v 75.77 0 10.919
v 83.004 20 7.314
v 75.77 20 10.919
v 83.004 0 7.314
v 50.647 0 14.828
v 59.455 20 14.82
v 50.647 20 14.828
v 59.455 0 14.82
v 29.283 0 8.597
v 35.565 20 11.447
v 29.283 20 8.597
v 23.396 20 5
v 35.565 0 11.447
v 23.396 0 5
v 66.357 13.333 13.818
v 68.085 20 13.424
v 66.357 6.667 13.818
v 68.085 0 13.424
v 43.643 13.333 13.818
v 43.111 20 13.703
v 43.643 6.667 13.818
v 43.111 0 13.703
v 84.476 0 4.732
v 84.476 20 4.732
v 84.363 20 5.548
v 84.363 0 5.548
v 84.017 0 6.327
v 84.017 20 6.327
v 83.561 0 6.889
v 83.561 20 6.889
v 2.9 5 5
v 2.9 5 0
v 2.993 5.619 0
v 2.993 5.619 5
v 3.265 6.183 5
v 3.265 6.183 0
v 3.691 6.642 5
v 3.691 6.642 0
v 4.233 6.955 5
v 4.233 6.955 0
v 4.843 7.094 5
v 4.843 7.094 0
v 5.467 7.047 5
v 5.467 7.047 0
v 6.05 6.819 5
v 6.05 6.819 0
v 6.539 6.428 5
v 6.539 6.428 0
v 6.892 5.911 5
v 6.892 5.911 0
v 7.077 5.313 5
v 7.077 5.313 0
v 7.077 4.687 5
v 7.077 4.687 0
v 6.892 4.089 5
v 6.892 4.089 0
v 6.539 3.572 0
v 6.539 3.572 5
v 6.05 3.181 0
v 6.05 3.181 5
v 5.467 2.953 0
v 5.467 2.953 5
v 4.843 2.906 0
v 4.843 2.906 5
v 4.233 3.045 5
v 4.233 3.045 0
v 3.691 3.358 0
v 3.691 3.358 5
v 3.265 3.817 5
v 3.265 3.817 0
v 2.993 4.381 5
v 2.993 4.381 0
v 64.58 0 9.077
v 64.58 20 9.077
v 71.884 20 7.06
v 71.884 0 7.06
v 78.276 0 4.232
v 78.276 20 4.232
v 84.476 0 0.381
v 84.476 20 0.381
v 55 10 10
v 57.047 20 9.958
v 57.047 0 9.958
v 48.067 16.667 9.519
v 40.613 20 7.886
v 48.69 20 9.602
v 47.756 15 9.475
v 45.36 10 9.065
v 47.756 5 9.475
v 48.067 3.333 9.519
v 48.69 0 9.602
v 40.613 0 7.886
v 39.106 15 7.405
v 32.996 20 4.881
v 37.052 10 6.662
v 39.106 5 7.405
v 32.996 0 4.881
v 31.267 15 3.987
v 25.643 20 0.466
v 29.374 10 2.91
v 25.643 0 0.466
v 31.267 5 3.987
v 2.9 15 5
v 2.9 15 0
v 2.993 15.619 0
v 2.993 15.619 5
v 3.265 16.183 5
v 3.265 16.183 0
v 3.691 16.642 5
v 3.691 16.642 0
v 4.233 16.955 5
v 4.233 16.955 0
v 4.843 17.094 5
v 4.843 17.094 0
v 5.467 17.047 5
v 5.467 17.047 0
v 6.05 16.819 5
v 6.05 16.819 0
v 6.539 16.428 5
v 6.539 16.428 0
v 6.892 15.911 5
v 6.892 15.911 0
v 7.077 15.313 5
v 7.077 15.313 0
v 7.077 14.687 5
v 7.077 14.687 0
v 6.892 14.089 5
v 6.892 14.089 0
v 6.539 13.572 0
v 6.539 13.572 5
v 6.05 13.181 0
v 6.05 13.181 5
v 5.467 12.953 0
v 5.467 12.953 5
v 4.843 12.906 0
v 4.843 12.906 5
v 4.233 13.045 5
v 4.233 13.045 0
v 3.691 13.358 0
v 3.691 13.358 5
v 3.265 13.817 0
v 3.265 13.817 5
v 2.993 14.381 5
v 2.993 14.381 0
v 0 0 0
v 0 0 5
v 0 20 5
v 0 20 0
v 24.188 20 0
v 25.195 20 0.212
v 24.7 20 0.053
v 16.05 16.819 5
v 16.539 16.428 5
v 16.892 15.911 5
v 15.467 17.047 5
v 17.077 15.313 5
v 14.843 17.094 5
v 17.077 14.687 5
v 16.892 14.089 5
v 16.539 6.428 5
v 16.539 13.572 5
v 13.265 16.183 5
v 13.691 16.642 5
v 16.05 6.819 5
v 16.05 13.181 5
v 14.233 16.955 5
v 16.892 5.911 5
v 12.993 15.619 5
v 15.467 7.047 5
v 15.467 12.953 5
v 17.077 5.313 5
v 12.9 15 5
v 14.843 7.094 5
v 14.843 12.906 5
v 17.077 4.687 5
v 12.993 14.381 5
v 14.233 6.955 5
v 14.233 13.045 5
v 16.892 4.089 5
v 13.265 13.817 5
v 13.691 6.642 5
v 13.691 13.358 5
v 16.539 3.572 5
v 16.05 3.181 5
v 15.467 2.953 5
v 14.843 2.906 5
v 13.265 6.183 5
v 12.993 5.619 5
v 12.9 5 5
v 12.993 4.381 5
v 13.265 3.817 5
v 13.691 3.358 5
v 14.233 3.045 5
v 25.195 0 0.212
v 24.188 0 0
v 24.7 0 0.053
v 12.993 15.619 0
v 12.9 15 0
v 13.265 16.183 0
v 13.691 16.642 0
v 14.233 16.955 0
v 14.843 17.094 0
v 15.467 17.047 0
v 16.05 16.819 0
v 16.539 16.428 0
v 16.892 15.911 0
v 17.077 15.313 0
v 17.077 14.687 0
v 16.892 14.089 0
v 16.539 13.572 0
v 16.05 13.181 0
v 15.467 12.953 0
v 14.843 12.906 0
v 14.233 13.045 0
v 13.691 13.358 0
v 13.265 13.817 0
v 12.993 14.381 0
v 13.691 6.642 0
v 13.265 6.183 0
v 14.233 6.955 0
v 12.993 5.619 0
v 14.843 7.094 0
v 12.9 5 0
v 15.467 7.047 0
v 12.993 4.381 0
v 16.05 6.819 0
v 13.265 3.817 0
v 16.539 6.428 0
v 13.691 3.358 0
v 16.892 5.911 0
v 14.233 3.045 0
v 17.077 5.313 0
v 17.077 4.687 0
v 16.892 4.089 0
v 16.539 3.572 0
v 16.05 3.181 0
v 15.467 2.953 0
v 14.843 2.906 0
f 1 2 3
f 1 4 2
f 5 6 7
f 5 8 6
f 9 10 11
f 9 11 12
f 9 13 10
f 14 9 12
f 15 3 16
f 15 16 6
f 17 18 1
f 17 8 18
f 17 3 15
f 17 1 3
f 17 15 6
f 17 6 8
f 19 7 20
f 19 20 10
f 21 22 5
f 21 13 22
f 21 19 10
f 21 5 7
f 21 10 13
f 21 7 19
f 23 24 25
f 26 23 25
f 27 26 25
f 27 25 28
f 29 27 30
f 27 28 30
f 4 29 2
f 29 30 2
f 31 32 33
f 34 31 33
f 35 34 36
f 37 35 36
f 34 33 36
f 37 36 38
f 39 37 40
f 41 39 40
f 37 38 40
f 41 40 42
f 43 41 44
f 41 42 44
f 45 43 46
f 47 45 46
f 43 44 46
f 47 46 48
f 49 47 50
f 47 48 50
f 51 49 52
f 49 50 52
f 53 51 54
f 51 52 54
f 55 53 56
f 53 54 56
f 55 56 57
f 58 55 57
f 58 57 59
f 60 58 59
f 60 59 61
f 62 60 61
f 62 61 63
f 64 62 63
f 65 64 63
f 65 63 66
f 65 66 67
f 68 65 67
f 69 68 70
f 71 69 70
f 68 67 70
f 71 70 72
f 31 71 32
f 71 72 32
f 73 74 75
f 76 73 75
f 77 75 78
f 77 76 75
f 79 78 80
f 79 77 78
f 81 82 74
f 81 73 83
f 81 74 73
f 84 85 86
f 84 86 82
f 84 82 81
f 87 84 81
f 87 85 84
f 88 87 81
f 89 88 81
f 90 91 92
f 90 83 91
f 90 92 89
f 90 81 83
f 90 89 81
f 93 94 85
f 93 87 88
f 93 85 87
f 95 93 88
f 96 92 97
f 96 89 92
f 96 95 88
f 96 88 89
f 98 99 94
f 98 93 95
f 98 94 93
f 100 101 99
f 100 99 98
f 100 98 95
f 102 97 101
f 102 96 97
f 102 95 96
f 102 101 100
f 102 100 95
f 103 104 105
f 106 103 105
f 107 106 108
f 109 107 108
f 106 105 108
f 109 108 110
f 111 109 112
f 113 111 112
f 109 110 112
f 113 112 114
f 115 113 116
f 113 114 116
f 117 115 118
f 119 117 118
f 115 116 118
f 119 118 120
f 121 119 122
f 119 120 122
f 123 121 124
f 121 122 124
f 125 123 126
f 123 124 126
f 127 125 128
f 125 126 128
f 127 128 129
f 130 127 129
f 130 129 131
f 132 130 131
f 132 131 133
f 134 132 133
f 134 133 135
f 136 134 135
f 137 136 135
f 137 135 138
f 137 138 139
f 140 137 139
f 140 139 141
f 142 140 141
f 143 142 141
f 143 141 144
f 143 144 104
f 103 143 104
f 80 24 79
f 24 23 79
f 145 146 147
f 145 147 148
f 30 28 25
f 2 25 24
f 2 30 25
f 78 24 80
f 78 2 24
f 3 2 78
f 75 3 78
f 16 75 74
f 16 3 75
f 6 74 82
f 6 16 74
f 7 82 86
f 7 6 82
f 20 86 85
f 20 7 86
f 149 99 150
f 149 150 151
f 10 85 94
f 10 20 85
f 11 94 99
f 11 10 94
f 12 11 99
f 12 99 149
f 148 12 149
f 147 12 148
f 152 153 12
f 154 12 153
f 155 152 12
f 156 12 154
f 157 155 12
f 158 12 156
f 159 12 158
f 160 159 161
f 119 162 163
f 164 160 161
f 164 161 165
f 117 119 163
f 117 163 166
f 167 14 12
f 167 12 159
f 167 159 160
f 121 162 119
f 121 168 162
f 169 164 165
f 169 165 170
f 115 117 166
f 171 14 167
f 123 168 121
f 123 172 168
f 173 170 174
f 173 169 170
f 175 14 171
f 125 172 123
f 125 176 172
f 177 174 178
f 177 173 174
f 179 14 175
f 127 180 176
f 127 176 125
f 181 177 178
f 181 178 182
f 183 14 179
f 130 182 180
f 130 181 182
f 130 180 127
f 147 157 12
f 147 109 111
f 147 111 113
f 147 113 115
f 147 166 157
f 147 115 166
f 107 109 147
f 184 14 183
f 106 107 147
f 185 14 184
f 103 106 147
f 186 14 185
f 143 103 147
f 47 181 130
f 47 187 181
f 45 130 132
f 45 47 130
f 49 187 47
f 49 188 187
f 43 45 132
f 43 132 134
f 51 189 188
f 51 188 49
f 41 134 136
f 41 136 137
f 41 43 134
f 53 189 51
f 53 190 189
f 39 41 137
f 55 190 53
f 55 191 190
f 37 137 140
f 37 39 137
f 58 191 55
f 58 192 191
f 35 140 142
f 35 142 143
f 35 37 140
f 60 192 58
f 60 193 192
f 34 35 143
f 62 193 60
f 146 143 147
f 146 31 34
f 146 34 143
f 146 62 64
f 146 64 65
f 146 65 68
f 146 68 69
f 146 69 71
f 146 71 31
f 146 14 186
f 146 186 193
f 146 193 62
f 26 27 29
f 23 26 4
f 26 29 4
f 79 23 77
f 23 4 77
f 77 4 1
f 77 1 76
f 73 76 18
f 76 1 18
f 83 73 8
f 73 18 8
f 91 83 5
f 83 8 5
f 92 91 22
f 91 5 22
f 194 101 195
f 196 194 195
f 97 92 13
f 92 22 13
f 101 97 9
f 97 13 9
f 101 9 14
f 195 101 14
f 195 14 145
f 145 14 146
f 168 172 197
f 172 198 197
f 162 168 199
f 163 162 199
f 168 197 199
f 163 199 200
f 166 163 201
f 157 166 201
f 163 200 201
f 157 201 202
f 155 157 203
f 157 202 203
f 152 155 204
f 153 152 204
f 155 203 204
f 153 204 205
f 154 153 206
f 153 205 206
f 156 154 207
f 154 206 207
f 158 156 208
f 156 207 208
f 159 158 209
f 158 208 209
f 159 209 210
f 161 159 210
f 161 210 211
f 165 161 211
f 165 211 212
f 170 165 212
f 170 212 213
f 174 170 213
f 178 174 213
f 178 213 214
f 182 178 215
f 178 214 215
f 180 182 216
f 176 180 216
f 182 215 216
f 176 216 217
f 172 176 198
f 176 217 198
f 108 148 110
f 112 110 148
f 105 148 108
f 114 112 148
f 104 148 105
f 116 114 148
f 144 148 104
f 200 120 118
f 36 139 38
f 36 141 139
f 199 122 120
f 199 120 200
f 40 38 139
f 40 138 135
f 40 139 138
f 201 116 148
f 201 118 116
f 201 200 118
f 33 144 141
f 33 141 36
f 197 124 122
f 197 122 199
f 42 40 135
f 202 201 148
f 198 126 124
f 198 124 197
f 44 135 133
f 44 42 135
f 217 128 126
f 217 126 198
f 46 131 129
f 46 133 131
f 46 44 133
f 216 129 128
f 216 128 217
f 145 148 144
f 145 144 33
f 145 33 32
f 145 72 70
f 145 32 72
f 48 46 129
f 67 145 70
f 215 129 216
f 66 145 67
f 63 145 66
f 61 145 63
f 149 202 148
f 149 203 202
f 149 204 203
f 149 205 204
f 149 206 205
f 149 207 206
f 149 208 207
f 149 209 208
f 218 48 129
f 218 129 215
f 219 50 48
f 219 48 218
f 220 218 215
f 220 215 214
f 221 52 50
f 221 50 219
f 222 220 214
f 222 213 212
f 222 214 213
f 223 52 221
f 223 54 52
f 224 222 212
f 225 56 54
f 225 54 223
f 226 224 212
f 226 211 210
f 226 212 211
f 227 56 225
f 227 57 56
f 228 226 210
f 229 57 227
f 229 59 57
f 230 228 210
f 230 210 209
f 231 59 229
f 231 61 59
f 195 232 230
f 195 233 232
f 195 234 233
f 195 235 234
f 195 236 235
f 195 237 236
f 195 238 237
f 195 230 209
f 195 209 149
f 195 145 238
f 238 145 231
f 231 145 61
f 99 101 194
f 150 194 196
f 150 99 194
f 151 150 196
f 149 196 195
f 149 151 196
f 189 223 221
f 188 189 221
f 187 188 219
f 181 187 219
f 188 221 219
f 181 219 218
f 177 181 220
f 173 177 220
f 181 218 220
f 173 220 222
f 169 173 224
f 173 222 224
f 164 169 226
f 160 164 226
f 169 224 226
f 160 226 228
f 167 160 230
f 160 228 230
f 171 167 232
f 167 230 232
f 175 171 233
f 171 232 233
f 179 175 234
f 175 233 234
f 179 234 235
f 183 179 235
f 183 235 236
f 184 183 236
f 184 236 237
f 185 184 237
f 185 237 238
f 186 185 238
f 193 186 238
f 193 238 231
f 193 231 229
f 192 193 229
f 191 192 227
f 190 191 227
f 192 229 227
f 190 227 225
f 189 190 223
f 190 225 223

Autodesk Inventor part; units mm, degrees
ref_plane "YZ Plane" through (0, 0, 0) normal (1, 0, 0) x (0, 1, 0)
ref_plane "XZ Plane" through (0, 0, 0) normal (0, 1, 0) x (-1, 0, 0)
ref_plane "XY Plane" through (0, 0, 0) normal (0, 0, 1) x (1, 0, 0)
sketch "Sketch1" plane through (0, 0, 0) normal (0, 1, 0) x (-1, 0, 0)
  line L0 (0, 0) -> (-25, 0)
  spline S0 degree 4 poles (-25, 0) (-32.0397, 5.1858) (-46.8322, 11.6047) (-63.1678, 11.6047) (-77.9603, 5.1858) (-85, 0) knots 0 0 0 0 0 0.5 1 1 1 1 1
  line L1 (-48.6479, 10) -> (-61.3521, 10) construction
  arc A0 (-49.9441, 9.7453) -> (-60.0559, 9.7453) centre (-55, -40.3178) ccw construction
  line L2 (-55, -16.2069) -> (-55, 34.9248) construction
  line L3 (-70, -22.2053) -> (-70, 28.9302) construction
  circle A1 centre (-55, -40) radius 50 construction
  line L4 (-23.3959, 5) -> (0, 5)
  line L5 (-84.476, 6.4124) -> (-84.476, 0)
  line L6 (-84.476, 0) -> (-85, 0)
  line L7 (0, 5) -> (0, 0)
  spline S1 degree 5 poles (-84.476, 6.4124) (-81.1502, 8.5173) (-77.647, 10.3417) (-73.9852, 11.8448) (-65.816, 14.3543) (-57.3038, 15.2371) (-52.6962, 15.2371) (-43.673, 14.3013) (-35.0354, 11.5377) (-30.933, 9.7391) (-27.0473, 7.5377) (-23.3959, 4.9999) knots 0 0 0 0 0 0 0.303739 0.303739 0.303739 0.656836 0.656836 0.656836 1 1 1 1 1 1
  point P0 (-40, 7.697)
  point P1 (-55, 10)
  point P2 (-70, 7.697)
  point P3 (-84.476, 0.3814)
  dimension "d5" = 5
  dimension "d0" = 60
  dimension "d1" = 25
  dimension "d2" = 100
extrude "Extrusion1" add sketch "Sketch1" along normal blind 20 contours L0 S0 L5 S1 L4 L7
sketch "Sketch2" plane through (25, 0, 0) normal (0, 0, -1) x (-1, 0, 0)
  circle A0 centre (10, 15) radius 2.1
  line L0 (0, 20) -> (25, 20) projected
  line L1 (0, 0) -> (25, 0) projected
  line L2 (25, 0) -> (25, 20) projected
  line L3 (0, 20) -> (25, 20) projected
  line L4 (0, 0) -> (0, 20) projected
  circle A1 centre (20, 15) radius 2.1
  circle A2 centre (10, 5) radius 2.1
  circle A3 centre (20, 5) radius 2.1
  dimension "d8" = 4.2
  dimension "d11" = 10
  dimension "d14" = 10
  dimension "d17" = 10
  dimension "d18" = 5
extrude "Extrusion2" cut sketch "Sketch2" against normal up to surface (5 mm away) contours A0 | A1 | A2 | A3
fillet "Fillet1" radius 3 1 edges at (84.476, 10, 6.4124)
fillet "Fillet2" radius 2.5 1 edges at (25, 10, 0)
properties part number "Gripper_Concave_Finger"
